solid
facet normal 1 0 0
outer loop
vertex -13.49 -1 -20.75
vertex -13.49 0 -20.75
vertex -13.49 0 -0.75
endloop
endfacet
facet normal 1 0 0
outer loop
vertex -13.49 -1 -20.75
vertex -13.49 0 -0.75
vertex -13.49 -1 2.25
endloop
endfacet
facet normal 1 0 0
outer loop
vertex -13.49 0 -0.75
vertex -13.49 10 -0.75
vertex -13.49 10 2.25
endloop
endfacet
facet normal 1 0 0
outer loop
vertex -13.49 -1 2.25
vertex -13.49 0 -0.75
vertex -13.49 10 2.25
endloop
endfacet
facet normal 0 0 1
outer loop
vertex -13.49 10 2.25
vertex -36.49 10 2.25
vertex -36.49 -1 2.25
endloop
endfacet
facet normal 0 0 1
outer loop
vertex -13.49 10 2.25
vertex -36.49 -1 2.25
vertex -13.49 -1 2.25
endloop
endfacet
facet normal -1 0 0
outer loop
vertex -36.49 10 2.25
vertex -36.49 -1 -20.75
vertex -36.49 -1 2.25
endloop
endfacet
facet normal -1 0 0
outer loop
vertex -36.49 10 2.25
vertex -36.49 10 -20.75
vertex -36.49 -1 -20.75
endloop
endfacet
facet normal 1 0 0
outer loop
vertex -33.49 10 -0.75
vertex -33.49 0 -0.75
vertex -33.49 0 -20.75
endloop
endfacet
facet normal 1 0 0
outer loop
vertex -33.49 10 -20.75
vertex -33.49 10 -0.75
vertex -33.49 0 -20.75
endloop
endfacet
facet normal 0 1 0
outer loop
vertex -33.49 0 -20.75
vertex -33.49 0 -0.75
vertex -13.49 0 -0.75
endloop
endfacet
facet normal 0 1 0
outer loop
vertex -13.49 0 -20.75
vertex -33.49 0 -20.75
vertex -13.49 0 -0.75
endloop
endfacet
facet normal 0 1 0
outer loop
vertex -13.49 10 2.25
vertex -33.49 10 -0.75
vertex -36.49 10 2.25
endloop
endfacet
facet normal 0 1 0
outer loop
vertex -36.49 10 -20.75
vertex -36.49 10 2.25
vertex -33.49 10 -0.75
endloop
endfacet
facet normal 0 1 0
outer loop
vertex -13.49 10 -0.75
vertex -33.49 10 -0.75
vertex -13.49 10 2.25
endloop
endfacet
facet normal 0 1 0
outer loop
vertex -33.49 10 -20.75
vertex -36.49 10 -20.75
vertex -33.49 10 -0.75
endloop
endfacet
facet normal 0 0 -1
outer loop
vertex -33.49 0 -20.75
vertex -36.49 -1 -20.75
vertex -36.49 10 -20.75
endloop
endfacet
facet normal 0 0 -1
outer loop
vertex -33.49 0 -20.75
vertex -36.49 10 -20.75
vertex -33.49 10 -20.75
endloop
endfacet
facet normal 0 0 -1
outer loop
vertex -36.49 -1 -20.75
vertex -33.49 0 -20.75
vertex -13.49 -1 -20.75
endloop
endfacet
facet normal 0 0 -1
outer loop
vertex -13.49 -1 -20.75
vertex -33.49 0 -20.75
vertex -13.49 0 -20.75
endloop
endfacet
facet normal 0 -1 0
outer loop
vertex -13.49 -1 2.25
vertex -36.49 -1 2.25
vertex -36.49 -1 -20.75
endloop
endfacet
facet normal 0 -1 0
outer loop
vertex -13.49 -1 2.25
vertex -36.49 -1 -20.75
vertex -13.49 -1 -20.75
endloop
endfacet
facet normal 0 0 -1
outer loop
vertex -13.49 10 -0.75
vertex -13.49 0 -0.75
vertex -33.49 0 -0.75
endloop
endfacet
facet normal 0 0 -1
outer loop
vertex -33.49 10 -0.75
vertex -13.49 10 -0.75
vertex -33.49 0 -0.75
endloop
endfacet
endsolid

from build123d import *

# Parameters (mm, degrees)
BOSS_EXTRUDE1_DEPTH = 10
SKETCH2_W           = 23
SKETCH2_H           = 23
BOSS_EXTRUDE2_DEPTH = 1


with BuildPart() as part:
    # Sketch1 → Boss-Extrude1 (new body)
    with BuildSketch(Plane(origin=(0, 0, 0), x_dir=(1, 0, 0), z_dir=(0, 1, 0))):
        Polygon((-36.489872914, 17.750117647), (-36.489872914, -2.249882353), (-13.489872914, -2.249882353), (-13.489872914, 0.750117647), (-33.489872914, 0.750117647), (-33.489872914, 20.750117647), (-36.489872914, 20.750117647), align=None)
    extrude(amount=BOSS_EXTRUDE1_DEPTH)

    # Sketch2 → Boss-Extrude2 (add)
    with BuildSketch(Plane.XZ):
        with Locations((-24.989872914, -9.250117647)):
            Rectangle(SKETCH2_W, SKETCH2_H)
    extrude(amount=BOSS_EXTRUDE2_DEPTH)


solid = part.part
